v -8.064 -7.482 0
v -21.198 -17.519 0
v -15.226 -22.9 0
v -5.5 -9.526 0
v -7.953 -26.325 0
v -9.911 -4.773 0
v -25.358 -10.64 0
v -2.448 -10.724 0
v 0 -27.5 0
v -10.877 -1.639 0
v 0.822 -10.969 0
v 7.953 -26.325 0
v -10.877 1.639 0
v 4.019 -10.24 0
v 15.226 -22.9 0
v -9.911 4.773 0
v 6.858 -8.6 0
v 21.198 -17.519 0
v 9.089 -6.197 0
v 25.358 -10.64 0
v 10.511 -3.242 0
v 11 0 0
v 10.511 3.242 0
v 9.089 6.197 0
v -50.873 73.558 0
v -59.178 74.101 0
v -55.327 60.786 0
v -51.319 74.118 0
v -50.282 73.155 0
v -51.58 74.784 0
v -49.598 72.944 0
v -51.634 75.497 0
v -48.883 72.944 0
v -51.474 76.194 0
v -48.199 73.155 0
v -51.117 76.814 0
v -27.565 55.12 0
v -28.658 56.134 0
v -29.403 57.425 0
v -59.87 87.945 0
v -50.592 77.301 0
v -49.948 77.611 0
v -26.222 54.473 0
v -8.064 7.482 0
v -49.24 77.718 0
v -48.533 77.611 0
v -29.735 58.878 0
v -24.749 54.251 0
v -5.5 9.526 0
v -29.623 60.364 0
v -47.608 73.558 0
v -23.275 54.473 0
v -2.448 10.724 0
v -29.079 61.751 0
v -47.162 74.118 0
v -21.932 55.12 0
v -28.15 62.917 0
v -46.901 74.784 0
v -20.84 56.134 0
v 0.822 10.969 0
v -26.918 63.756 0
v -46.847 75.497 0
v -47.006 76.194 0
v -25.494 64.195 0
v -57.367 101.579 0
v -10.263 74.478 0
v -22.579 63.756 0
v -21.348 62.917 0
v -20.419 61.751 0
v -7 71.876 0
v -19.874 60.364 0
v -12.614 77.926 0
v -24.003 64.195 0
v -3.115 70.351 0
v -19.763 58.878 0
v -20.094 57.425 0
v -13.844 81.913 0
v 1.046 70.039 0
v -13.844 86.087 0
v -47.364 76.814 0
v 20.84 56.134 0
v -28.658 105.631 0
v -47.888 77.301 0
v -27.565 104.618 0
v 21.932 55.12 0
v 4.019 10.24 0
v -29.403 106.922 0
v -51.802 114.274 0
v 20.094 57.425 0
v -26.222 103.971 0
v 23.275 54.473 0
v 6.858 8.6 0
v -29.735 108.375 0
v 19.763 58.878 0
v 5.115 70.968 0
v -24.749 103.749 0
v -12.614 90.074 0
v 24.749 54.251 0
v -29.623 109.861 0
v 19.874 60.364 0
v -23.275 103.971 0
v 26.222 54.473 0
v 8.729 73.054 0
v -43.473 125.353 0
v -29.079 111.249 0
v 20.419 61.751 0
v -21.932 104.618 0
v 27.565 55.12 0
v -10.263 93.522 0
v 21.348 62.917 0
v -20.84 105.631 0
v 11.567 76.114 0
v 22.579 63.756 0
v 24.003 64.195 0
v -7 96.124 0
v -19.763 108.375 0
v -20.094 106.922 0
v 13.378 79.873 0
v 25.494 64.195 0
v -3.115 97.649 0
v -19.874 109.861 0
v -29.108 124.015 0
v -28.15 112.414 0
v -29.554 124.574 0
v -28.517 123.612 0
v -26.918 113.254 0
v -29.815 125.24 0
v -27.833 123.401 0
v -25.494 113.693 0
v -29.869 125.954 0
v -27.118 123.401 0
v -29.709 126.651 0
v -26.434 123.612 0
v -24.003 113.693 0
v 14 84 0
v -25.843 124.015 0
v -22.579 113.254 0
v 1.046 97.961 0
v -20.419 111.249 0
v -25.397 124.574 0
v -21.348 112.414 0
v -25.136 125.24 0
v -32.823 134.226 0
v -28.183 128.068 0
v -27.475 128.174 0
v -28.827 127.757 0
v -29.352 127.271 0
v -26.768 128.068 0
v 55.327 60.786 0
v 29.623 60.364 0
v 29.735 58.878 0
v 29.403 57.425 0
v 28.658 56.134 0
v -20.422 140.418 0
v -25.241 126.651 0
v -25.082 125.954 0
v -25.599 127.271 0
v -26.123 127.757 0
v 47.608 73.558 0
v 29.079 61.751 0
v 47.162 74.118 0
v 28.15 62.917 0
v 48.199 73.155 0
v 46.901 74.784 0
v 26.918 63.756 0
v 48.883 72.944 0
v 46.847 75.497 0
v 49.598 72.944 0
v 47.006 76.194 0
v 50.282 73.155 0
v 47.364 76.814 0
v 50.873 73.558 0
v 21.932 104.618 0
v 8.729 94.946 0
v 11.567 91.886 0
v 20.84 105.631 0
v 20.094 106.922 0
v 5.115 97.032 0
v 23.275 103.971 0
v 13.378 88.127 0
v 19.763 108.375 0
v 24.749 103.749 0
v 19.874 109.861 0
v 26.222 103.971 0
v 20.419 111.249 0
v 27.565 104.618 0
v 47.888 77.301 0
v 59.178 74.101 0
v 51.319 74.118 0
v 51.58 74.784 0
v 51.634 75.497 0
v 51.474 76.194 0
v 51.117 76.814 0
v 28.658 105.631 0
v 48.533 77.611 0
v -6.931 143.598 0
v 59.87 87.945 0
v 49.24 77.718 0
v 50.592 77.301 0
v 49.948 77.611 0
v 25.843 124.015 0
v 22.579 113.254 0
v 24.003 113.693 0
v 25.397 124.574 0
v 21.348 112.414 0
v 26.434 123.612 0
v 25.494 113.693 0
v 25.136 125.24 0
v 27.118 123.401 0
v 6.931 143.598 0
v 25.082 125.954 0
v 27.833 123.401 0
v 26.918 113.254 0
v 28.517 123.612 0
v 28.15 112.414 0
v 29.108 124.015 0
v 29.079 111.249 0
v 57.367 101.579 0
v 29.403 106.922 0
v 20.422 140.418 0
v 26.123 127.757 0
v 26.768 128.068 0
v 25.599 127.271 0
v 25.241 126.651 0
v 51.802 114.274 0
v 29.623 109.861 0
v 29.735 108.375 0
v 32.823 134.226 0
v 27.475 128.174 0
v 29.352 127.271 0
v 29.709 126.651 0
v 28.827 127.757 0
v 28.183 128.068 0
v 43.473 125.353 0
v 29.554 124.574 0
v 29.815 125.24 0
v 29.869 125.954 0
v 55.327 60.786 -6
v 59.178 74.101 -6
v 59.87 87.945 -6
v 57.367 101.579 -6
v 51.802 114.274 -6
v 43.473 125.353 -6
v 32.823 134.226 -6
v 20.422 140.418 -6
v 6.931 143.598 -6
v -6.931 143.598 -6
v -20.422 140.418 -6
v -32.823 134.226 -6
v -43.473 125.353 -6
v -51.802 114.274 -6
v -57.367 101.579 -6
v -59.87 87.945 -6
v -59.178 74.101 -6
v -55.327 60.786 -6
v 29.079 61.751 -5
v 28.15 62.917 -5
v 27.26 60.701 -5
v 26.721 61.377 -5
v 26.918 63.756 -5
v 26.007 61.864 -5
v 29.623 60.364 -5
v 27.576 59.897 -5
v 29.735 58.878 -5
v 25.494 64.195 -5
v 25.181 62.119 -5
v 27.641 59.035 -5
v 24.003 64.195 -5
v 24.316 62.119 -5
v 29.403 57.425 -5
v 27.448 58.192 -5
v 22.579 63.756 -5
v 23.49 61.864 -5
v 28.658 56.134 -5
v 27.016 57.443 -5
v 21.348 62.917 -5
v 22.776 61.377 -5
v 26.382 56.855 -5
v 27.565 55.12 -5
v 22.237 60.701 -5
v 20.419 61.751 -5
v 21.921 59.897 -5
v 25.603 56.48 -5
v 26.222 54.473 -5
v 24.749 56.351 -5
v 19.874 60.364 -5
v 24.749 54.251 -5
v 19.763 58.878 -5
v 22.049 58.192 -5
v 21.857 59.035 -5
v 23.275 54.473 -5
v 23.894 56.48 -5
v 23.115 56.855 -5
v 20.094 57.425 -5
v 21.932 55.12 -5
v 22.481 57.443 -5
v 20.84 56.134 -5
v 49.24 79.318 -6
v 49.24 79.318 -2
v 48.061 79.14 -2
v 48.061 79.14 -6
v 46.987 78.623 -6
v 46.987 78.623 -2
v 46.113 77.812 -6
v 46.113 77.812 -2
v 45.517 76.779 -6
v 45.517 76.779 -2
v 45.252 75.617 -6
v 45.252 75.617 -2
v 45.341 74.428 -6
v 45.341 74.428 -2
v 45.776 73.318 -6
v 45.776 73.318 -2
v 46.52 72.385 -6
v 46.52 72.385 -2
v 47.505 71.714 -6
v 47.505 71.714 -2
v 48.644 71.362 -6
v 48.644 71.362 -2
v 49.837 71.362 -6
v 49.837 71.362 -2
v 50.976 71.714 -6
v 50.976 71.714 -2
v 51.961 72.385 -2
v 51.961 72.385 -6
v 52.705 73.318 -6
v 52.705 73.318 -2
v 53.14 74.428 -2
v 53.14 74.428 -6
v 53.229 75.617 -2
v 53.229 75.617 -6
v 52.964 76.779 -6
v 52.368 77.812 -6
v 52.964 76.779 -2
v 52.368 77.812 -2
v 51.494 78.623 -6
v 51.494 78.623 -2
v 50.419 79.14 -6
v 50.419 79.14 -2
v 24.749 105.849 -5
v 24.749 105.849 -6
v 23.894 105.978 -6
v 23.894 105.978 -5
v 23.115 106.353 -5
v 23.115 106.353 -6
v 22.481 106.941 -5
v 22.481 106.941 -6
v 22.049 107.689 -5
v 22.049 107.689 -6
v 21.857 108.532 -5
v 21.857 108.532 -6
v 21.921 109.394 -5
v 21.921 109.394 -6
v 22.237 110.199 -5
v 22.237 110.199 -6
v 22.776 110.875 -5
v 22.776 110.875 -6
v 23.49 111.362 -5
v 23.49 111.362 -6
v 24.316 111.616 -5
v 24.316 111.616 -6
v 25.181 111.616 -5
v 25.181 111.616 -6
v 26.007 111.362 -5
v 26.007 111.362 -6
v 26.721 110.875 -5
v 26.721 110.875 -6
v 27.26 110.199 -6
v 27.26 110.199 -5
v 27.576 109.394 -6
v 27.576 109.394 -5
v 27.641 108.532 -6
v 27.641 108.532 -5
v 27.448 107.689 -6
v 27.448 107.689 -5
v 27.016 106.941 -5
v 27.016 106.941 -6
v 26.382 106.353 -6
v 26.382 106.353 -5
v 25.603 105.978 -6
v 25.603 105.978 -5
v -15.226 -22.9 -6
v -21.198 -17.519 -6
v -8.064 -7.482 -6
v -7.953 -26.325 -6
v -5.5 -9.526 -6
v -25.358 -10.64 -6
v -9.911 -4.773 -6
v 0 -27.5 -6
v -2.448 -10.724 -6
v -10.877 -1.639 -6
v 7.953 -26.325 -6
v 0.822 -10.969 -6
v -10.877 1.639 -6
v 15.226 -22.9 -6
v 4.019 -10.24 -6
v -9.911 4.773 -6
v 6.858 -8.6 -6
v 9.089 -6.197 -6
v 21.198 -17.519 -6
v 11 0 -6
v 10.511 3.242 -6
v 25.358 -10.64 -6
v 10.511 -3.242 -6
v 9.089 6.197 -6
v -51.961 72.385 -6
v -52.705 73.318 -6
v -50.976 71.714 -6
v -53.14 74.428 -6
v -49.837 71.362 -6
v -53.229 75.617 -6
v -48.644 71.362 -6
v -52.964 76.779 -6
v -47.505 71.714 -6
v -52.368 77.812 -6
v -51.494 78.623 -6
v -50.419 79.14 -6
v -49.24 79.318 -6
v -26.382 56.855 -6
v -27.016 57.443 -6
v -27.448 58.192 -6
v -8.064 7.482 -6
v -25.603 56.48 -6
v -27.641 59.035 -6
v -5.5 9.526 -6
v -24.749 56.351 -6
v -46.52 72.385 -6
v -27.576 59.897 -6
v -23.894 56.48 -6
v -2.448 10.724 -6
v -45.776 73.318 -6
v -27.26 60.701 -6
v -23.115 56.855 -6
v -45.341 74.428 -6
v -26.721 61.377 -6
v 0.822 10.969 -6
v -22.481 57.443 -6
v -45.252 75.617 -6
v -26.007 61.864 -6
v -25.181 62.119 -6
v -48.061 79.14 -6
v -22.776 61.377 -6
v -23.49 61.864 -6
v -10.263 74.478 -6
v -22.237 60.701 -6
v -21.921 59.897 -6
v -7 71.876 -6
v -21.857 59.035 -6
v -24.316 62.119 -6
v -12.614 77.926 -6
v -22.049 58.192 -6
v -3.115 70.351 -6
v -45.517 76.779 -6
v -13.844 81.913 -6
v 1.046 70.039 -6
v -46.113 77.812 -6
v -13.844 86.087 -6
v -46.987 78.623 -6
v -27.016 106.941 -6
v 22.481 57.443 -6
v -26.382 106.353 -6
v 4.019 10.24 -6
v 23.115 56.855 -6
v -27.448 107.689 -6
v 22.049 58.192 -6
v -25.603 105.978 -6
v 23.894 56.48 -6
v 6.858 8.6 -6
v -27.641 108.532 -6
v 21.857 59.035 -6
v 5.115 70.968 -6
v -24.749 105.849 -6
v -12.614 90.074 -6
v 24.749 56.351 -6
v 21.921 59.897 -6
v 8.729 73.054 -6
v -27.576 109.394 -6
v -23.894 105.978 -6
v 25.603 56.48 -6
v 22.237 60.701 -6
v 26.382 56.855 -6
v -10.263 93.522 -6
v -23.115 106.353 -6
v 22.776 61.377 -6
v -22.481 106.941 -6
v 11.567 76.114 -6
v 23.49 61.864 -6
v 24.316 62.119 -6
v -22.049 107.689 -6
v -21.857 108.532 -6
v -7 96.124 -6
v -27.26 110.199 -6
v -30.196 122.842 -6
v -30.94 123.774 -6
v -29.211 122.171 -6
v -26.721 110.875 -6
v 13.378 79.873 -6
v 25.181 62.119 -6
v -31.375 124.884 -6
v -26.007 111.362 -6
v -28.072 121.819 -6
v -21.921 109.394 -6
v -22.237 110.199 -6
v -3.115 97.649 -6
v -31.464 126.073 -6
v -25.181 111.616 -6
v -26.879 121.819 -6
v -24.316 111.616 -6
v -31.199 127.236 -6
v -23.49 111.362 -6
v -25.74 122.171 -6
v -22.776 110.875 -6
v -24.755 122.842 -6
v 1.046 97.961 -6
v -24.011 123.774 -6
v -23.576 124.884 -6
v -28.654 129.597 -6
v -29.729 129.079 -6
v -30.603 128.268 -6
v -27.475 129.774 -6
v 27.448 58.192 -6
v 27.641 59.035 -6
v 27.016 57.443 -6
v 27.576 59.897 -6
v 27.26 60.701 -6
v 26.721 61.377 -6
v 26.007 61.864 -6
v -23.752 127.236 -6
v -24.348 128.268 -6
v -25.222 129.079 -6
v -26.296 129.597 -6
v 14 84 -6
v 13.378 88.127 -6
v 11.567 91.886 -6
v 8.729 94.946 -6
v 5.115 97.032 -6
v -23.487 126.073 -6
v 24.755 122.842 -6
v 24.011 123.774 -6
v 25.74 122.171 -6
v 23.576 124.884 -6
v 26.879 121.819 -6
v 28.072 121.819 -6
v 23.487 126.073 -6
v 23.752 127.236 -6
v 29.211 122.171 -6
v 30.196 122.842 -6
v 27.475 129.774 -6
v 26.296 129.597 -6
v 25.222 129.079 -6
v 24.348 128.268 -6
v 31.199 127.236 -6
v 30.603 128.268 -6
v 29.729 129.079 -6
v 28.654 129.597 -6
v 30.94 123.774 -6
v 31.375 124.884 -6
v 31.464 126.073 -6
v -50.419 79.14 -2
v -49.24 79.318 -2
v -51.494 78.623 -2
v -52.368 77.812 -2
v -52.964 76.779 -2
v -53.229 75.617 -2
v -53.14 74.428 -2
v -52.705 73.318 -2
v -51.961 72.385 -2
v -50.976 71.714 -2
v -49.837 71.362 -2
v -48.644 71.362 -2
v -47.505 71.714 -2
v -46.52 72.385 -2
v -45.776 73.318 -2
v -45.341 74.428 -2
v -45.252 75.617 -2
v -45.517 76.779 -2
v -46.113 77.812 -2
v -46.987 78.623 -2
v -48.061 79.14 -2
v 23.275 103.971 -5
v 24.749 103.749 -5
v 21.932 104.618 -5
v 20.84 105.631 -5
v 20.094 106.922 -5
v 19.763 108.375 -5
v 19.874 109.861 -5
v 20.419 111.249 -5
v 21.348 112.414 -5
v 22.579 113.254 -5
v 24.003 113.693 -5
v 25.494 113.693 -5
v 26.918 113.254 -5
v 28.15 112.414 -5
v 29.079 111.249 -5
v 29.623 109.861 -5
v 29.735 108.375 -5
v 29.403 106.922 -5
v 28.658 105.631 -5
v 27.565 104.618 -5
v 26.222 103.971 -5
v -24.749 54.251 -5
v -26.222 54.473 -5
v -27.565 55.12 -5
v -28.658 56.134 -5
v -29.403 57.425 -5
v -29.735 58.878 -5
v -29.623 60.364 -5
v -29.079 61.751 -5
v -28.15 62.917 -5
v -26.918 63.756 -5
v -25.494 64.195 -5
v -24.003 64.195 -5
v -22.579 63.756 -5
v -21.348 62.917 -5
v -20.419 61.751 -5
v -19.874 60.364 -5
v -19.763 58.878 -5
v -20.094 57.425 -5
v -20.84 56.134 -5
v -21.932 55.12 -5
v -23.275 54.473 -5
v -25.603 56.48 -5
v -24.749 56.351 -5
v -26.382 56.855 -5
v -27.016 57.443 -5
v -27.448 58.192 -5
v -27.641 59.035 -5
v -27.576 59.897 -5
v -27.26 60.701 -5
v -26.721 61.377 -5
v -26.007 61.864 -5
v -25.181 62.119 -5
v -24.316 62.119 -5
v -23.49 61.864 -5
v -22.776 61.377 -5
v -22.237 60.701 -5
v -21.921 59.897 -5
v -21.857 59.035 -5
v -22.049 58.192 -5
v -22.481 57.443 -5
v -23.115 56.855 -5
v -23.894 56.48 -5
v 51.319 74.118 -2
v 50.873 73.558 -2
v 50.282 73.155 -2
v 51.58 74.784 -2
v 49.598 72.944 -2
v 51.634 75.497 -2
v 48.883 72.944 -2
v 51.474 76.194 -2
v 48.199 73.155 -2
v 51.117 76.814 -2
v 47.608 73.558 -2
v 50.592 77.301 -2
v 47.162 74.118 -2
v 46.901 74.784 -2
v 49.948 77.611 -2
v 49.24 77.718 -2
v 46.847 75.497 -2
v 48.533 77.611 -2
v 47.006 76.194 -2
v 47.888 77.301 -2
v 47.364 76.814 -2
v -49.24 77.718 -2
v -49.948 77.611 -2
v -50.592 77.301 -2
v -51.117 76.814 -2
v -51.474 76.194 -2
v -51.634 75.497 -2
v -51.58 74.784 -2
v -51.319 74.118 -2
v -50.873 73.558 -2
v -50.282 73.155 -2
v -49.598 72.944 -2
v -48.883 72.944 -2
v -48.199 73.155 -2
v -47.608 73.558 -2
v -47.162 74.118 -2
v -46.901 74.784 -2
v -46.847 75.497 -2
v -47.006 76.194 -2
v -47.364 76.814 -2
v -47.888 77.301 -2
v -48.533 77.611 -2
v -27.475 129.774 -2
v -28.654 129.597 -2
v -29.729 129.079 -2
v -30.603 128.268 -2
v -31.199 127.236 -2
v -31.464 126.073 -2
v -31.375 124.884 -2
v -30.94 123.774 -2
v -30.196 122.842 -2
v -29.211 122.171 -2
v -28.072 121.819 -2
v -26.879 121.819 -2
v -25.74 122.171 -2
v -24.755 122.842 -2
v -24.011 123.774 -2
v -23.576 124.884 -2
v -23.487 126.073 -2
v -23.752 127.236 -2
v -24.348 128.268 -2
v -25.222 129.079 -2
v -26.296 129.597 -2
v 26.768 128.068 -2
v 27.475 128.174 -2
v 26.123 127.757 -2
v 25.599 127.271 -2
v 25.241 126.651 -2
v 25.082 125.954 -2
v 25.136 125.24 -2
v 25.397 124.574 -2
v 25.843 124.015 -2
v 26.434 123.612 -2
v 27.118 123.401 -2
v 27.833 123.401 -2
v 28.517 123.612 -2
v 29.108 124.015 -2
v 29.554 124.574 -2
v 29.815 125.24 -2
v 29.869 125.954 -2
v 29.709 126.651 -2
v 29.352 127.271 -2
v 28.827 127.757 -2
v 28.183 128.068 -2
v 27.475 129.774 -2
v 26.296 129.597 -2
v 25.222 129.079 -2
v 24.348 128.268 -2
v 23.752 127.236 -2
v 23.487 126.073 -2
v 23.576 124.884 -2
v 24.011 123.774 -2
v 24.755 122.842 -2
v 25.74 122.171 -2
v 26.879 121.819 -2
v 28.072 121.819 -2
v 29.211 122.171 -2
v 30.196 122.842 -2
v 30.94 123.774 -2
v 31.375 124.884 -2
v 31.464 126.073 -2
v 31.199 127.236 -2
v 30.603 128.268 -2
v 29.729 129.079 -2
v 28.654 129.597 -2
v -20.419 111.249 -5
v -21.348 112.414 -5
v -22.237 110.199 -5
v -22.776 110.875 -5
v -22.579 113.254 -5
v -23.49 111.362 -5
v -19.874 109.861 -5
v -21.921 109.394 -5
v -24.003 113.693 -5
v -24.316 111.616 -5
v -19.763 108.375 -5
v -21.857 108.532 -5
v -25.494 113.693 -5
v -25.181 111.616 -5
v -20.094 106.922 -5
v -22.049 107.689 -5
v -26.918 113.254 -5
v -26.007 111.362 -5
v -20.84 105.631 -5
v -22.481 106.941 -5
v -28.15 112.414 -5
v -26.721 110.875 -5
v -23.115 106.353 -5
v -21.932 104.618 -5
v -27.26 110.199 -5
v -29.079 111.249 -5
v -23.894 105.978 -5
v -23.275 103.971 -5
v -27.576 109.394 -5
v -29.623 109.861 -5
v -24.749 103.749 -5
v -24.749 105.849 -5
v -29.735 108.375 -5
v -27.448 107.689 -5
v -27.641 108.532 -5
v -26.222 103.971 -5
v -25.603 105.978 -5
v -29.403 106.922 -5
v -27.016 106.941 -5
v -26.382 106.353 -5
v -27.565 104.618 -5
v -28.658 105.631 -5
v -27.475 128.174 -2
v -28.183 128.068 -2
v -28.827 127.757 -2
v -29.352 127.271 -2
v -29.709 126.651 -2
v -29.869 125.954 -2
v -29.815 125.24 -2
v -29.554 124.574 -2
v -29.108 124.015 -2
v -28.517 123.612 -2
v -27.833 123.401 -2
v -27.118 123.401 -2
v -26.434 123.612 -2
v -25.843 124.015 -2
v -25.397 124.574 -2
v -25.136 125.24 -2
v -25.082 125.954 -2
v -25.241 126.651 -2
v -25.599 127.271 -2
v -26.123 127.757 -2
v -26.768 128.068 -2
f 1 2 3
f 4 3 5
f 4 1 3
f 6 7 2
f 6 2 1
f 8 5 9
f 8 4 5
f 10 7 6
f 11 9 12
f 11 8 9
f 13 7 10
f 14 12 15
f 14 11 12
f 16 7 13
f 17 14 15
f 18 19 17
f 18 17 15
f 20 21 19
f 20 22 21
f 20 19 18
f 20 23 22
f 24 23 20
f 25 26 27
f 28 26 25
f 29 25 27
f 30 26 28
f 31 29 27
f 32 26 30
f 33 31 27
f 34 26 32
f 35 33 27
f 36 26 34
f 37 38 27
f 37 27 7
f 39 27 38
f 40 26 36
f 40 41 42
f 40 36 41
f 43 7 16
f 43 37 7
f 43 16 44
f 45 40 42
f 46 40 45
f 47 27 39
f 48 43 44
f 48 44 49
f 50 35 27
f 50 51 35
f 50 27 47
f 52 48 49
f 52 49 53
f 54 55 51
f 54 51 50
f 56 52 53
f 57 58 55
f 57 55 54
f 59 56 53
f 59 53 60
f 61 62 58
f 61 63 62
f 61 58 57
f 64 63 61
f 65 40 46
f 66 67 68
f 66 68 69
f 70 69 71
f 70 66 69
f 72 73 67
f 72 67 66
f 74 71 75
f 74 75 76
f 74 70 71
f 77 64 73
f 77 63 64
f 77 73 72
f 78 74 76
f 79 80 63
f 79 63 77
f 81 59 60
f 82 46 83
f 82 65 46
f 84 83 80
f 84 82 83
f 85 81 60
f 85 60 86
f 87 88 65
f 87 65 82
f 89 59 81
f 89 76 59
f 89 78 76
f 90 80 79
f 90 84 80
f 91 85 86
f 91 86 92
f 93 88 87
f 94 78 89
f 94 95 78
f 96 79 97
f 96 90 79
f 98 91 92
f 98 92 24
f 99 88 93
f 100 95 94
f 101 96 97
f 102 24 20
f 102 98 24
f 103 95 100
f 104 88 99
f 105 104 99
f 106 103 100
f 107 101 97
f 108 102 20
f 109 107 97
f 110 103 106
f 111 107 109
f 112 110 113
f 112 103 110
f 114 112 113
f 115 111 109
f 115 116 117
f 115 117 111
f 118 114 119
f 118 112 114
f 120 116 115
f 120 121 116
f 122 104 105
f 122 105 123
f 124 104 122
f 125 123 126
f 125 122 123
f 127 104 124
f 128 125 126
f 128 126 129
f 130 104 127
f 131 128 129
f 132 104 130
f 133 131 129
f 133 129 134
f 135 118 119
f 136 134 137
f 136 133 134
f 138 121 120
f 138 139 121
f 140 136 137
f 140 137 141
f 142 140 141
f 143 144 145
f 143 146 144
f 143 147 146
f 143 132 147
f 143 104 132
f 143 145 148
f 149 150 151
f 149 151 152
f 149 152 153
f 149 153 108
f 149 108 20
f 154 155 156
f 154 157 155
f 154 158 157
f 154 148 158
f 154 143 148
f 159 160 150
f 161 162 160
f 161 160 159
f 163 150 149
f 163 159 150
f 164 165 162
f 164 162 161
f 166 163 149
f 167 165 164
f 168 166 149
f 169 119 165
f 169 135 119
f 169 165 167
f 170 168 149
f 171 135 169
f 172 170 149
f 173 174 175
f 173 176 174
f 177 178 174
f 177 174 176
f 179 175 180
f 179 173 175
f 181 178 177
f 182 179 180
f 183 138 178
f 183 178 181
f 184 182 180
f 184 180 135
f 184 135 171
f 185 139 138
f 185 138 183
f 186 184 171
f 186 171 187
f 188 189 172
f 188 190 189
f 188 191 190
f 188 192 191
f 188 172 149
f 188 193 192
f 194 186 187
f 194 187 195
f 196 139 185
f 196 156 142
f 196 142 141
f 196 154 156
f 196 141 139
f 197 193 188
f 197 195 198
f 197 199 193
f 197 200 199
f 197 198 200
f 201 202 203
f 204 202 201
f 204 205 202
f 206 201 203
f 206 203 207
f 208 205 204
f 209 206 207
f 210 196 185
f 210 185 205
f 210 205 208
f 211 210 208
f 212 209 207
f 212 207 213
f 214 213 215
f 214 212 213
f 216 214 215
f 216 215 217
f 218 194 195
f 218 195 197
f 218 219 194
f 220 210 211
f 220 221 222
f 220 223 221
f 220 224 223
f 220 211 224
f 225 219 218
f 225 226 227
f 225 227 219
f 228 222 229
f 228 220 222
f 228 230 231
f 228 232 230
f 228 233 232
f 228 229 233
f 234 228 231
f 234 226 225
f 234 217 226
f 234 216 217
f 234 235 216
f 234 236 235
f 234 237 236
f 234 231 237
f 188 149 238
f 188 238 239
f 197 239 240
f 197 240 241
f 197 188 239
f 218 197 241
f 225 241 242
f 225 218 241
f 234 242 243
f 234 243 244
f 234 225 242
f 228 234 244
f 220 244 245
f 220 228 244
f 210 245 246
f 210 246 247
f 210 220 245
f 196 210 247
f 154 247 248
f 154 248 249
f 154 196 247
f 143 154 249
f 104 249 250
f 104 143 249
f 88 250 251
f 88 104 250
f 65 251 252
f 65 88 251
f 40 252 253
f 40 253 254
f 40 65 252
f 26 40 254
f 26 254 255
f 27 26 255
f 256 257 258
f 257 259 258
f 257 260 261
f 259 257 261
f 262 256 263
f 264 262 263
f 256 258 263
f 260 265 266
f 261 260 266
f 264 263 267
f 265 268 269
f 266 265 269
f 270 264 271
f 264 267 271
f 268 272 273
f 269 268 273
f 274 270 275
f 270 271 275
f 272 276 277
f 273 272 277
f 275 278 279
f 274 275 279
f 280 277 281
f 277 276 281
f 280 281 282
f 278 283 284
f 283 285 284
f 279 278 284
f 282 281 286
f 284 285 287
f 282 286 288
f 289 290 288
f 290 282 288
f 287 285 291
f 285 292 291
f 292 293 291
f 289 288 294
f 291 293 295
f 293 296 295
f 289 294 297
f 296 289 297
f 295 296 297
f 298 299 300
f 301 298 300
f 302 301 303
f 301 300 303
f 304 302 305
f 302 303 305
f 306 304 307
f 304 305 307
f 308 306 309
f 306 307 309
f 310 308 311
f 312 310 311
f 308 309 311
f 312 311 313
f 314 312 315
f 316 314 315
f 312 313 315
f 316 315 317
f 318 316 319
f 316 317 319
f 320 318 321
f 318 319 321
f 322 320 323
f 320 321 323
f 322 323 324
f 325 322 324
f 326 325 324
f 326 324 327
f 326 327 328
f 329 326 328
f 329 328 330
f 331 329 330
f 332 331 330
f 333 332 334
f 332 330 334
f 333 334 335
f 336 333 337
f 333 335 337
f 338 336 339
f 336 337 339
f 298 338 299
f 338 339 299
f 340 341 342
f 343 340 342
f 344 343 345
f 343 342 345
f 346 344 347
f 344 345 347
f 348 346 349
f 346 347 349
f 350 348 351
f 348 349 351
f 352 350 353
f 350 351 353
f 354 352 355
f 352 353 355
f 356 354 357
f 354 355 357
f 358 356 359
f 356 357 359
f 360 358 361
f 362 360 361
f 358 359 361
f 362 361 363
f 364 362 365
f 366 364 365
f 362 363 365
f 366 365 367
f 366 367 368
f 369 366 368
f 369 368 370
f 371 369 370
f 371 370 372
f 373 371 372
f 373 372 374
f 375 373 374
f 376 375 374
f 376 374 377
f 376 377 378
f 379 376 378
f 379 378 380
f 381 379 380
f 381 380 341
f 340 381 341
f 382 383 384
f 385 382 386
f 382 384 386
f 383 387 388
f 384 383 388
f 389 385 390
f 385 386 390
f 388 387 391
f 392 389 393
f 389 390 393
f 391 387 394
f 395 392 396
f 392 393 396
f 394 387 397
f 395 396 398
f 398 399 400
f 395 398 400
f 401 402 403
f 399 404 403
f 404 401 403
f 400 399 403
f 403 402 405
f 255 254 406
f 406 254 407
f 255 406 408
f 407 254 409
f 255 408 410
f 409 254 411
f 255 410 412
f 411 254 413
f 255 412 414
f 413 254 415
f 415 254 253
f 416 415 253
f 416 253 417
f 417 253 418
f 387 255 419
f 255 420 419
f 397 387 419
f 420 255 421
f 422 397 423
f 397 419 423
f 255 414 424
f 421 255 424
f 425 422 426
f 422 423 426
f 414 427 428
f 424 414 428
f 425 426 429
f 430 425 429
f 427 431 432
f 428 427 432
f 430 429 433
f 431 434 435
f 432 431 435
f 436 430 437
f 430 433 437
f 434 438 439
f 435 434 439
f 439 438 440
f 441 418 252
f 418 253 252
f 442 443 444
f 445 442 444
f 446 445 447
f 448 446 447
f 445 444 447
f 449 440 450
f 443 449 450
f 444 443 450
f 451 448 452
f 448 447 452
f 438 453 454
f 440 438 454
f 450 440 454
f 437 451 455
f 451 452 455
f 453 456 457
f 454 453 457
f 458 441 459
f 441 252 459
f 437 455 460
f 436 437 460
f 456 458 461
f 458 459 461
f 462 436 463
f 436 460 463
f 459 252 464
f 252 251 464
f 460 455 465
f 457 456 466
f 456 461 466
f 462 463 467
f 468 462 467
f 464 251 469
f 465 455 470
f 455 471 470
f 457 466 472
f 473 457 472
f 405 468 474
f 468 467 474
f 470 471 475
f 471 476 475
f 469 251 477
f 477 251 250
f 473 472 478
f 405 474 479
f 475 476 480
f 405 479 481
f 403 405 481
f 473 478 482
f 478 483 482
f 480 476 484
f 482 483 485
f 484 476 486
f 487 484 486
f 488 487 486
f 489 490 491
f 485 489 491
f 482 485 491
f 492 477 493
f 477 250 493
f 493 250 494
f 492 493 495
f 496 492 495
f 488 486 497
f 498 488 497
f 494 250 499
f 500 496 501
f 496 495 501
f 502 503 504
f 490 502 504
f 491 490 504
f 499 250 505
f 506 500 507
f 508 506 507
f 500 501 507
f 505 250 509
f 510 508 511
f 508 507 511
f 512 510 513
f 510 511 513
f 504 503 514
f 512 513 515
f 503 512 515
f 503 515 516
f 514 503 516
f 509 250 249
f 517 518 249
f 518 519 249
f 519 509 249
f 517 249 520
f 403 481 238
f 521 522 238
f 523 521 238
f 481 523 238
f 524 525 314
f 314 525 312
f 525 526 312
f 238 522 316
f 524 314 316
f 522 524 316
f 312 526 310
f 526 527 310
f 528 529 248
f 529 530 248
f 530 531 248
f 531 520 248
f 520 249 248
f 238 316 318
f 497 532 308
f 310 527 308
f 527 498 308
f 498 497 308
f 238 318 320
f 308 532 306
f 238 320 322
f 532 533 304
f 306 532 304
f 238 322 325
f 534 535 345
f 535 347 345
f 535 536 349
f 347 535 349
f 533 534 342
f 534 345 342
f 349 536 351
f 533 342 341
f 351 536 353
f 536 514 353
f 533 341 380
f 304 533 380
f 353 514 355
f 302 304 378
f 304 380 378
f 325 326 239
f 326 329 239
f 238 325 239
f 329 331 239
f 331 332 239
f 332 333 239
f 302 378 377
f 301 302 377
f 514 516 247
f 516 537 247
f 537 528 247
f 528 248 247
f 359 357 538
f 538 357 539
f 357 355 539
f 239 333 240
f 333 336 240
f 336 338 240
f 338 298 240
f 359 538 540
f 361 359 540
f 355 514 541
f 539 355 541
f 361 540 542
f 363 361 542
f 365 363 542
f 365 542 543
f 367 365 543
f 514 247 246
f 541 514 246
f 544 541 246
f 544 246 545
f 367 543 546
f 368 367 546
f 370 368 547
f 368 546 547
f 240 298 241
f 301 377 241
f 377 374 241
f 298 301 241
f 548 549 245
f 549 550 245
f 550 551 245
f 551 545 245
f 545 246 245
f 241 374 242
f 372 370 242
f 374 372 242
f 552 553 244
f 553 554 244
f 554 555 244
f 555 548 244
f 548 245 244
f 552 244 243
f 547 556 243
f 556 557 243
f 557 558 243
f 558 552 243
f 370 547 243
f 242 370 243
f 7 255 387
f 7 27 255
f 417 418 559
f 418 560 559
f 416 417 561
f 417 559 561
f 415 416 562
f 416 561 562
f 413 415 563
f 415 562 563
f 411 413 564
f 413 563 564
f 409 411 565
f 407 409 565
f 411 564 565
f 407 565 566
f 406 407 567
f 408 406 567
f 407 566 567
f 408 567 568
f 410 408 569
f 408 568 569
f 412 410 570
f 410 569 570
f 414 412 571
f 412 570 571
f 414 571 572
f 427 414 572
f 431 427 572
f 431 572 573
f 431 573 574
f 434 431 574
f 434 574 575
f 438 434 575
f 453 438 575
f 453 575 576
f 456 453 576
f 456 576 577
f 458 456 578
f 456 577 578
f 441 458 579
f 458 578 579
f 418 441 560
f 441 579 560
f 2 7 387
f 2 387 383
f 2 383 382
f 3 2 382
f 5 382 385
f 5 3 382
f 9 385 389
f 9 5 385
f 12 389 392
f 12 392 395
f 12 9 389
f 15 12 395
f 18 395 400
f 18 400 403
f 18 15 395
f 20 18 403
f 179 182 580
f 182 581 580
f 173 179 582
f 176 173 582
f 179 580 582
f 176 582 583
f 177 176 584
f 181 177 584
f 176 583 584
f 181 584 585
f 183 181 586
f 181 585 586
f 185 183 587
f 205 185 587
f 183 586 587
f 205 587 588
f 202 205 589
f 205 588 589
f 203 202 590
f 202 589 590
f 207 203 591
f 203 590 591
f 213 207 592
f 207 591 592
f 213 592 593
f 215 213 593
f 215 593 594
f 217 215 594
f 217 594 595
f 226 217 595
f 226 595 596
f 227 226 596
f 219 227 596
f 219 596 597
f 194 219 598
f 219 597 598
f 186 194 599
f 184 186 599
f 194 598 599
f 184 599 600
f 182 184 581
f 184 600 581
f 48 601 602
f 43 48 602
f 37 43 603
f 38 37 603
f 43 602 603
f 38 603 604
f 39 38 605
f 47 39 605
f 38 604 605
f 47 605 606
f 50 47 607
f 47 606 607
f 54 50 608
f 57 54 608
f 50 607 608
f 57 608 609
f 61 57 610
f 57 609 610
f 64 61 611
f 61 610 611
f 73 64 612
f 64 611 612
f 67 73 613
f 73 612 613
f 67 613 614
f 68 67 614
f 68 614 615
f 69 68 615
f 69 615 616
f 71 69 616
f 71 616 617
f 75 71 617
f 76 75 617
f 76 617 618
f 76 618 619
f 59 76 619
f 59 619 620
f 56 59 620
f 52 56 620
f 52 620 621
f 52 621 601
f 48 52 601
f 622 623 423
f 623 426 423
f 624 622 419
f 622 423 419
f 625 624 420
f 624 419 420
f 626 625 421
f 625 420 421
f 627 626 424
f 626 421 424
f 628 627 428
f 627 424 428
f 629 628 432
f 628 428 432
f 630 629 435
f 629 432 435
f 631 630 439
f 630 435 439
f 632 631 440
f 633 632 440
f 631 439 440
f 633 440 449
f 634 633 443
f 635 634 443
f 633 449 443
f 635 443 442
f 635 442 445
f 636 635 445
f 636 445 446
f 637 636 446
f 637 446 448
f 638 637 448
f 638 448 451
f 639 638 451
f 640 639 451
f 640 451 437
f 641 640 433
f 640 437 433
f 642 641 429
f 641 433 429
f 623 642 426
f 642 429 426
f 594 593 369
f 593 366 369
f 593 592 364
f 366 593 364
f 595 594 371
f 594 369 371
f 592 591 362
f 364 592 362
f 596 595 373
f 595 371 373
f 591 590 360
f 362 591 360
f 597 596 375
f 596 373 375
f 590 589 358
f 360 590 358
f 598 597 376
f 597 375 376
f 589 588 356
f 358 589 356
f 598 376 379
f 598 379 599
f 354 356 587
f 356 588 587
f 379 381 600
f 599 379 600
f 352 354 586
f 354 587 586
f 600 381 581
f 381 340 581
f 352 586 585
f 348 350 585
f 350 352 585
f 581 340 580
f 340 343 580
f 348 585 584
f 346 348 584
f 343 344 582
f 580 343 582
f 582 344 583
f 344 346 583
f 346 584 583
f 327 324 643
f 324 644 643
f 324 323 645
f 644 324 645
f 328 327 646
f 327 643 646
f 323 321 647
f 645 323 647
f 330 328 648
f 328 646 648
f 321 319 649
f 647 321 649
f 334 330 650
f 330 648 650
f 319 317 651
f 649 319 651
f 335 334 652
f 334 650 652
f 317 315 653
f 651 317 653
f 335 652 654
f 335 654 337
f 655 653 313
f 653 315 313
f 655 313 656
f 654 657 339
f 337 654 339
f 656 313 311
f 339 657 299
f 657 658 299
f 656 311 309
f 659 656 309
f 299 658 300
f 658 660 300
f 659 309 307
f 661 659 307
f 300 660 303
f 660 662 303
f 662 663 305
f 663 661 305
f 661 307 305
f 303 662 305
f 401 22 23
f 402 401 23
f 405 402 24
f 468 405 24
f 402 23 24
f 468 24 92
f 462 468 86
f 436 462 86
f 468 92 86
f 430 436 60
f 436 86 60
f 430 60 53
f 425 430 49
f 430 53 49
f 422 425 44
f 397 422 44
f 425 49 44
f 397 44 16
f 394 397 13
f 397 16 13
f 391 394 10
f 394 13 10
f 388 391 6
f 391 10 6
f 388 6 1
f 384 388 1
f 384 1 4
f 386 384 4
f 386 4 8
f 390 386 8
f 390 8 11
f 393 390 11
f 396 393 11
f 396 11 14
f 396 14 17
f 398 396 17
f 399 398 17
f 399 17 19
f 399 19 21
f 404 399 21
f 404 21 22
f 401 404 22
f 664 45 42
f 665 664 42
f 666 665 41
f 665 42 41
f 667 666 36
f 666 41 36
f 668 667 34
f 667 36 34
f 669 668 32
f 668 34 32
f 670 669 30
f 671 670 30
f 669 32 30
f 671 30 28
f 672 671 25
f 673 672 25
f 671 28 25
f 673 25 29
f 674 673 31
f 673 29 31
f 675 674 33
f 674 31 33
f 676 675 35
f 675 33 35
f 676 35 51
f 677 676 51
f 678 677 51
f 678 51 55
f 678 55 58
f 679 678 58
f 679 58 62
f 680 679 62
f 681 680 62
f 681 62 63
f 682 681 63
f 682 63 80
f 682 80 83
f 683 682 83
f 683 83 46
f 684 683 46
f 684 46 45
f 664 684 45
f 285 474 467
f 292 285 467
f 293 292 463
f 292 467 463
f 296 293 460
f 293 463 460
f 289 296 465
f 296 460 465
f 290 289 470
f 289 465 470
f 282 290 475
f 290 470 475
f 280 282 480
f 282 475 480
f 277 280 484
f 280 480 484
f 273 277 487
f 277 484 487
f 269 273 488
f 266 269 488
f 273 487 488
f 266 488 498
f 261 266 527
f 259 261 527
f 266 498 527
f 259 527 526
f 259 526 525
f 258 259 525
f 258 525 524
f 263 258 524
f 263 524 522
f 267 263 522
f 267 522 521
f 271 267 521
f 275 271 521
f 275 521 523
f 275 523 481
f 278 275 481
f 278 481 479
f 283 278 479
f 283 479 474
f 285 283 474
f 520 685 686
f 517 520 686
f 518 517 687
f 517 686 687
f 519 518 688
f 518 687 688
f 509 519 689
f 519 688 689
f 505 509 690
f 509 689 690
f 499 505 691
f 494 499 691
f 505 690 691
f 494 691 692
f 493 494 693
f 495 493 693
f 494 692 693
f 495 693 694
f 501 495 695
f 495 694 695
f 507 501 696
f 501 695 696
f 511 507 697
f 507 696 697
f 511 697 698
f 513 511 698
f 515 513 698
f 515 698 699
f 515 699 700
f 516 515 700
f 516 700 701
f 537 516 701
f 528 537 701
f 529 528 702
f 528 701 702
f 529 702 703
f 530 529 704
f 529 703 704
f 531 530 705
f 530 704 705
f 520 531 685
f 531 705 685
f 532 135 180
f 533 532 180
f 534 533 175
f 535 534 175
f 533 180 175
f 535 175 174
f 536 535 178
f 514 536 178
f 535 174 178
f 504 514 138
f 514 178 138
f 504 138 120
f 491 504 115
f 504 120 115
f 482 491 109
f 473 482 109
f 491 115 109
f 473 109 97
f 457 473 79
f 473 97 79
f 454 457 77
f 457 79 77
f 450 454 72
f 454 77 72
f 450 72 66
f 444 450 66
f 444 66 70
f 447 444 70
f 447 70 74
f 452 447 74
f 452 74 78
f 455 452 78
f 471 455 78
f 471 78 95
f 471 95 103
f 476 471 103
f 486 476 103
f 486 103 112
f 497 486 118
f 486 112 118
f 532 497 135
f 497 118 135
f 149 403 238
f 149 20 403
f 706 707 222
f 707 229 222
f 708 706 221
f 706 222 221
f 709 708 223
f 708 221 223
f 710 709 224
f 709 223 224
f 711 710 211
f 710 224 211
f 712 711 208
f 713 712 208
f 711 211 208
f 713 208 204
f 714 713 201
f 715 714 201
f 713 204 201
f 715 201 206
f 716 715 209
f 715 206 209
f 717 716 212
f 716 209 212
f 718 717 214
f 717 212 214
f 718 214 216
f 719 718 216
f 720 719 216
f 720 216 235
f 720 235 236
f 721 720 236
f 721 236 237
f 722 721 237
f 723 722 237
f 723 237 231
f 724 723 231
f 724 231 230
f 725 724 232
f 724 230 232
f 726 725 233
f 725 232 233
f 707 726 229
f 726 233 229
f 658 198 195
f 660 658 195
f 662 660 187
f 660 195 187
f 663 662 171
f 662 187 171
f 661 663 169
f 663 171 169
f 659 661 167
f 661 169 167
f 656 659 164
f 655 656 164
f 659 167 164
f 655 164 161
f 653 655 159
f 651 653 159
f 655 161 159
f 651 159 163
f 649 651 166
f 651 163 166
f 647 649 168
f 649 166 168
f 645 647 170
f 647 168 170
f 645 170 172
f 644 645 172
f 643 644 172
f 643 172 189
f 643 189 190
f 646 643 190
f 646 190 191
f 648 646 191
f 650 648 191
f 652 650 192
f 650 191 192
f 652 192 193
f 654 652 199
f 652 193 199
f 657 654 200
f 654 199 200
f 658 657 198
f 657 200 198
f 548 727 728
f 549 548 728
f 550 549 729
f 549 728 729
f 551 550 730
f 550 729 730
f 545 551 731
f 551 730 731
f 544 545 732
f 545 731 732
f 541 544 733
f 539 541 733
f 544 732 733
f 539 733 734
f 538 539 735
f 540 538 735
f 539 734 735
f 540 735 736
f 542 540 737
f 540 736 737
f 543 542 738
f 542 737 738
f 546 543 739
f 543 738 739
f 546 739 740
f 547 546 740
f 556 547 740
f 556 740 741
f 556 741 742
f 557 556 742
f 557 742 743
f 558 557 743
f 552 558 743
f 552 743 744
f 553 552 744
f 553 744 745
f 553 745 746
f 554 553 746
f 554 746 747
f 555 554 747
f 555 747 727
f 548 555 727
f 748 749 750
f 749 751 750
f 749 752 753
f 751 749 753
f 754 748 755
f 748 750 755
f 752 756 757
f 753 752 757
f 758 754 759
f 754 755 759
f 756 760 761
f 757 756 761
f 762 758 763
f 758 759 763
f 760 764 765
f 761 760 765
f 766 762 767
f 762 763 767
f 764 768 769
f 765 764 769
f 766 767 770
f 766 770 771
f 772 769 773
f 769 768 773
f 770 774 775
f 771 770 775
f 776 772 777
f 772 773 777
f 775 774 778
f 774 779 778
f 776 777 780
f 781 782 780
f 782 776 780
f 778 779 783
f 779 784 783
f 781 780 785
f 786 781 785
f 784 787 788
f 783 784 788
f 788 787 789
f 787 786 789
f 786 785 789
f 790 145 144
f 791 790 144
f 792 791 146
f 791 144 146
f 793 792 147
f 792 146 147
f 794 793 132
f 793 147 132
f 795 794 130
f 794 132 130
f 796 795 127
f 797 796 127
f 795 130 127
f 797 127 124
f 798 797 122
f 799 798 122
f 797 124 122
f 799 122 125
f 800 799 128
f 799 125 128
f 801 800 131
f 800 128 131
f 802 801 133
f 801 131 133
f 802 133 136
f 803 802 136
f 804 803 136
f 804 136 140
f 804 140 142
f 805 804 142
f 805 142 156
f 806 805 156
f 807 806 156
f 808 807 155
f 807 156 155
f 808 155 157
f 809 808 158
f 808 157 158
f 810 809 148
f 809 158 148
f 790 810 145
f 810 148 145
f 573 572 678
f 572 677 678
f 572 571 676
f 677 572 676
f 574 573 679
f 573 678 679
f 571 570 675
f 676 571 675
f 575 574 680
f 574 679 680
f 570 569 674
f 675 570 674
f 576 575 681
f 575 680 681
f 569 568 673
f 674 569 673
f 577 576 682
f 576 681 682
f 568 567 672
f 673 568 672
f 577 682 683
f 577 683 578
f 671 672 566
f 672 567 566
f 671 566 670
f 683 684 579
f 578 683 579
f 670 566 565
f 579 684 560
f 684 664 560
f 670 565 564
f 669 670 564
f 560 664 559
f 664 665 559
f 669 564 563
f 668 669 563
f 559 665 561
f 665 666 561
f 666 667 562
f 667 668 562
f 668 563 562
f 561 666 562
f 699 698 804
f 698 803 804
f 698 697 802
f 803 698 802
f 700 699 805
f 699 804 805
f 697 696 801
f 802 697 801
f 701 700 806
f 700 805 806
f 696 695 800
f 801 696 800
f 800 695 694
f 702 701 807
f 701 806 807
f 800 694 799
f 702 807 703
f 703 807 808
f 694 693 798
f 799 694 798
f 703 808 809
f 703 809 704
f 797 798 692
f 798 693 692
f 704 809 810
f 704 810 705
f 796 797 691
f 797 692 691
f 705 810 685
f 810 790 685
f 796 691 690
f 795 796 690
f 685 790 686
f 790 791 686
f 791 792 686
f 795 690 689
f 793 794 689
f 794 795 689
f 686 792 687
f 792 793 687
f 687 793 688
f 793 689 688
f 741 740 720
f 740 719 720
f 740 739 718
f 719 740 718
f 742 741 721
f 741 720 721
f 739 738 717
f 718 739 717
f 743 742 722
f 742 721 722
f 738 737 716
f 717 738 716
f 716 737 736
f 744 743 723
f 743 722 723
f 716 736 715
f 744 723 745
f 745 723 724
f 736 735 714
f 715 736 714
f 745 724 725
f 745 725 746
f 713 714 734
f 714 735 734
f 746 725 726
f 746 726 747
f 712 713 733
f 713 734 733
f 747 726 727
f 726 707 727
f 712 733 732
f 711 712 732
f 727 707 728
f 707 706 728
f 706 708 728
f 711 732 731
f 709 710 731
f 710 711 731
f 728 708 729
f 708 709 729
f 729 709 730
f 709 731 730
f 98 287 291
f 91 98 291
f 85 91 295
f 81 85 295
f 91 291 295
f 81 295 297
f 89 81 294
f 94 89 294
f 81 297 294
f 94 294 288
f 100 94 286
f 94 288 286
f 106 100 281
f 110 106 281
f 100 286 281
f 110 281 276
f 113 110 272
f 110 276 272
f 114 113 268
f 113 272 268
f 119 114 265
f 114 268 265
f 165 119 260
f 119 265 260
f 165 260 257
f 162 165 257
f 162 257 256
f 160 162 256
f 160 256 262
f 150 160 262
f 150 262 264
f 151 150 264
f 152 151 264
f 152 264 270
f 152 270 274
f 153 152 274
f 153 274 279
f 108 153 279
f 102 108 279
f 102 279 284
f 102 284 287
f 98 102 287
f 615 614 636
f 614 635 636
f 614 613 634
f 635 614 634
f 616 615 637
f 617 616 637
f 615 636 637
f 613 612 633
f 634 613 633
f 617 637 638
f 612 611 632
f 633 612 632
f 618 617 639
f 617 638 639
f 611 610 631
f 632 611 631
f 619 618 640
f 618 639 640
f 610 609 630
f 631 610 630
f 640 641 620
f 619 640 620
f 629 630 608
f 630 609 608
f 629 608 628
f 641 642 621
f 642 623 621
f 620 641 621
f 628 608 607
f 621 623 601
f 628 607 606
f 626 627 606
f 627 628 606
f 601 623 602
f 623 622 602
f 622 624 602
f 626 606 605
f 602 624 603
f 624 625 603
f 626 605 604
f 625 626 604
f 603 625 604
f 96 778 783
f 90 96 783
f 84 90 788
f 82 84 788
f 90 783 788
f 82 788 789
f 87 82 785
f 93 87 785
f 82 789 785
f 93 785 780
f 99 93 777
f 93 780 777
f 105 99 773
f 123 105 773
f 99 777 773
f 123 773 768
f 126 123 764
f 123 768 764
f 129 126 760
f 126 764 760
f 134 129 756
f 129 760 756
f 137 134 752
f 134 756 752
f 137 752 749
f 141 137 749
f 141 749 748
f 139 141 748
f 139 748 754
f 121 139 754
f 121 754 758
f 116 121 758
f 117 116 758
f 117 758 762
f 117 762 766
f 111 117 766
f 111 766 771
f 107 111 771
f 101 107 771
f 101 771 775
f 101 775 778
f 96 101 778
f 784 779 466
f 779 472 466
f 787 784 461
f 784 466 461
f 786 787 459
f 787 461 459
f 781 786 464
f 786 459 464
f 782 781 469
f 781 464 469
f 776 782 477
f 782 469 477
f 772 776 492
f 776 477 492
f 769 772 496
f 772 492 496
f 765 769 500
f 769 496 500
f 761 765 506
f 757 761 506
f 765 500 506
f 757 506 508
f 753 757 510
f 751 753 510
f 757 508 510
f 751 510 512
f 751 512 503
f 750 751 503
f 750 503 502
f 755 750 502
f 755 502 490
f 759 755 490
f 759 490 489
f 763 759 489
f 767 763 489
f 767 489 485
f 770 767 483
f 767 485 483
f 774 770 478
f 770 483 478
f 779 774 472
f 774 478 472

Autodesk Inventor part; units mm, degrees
ref_plane "YZ Plane" through (0, 0, 0) normal (1, 0, 0) x (0, 1, 0)
ref_plane "XZ Plane" through (0, 0, 0) normal (0, 1, 0) x (-1, 0, 0)
ref_plane "XY Plane" through (0, 0, 0) normal (0, 0, 1) x (1, 0, 0)
sketch "Sketch1" plane through (0, 0, 0) normal (0, 0, 1) x (1, 0, 0)
  circle A0 centre (0, 0) radius 11
  circle A1 centre (0, 84) radius 14
  circle A2 centre (0, 0) radius 72 construction
  circle A3 centre (0, 84) radius 12 construction
  line L0 (0, 84) -> (0, 0) construction
  line L1 (-67.6579, 24.6255) -> (0, 0) construction
  line L2 (67.6579, 24.6255) -> (0, 0) construction
  circle A4 centre (0, 84) radius 35 construction
  line L3 (-60, 71.9226) -> (-60, 144)
  line L4 (-60, 144) -> (60, 144)
  line L5 (60, 144) -> (60, 71.9226)
  circle A5 centre (0, 0) radius 27.5
  line L6 (25.3583, -10.6399) -> (60, 71.9226)
  line L7 (-60, 71.9226) -> (-25.3583, -10.6399)
  line L8 (0, 0) -> (135.9462, -63.3927) construction
  line L9 (-24.7487, 59.2513) -> (24.7487, 59.2513) construction
  circle A6 centre (0, 84) radius 60
  point P0 (24.7487, 108.7487)
  point P1 (-24.7487, 108.7487)
  point P2 (55.3272, 60.7857)
  point P3 (-55.3272, 60.7857)
  dimension "d7" = 70
  dimension "d1" = 24
  dimension "d2" = 144
  dimension "d3" = 28
  dimension "d4" = 22
  dimension "d6" = 220
  dimension "d10" = 360
  dimension "d12" = 55
  dimension "d17" = 150
  dimension "d18" = 45
  dimension "d28" = 120
sketch "Sketch2" plane through (0, 0, 0) normal (0, 0, 1) x (1, 0, 0)
  point P0 (0, 0)
extrude "Extrusion1" add sketch "Sketch1" against normal blind 6 contours A6 A5 | A6 A5 L7 | A5 A6 | A5 A6 | A5 A6 L6
hole "Hole1" at (-24.7487, 59.2513, 0) at (-24.7487, 108.7487, 0) at (24.7487, 108.7487, 0) at (24.7487, 59.2513, 0) direction (0, 0, -1) diameter 5.8 end through all counterbore diameter 10 counterbore depth 5 clearance for "Socket Head Cap Screw" size "M5" standard "Ansi Metric M Profile"
sketch "Sketch3" plane through (0, 0, -6) normal (0, 0, -1) x (-1, 0, 0)
  circle A0 centre (0, 84) radius 50 construction
  line L0 (0, 84) -> (0, 134) construction
  circle A1 centre (0, 84) radius 14 construction
  line L1 (-49.2404, 75.3176) -> (0, 84) construction
  point P0 (0, 0)
  point P1 (-27.4754, 125.7744)
  point P2 (27.4754, 125.7744)
  point P3 (49.2404, 75.3176)
  dimension "d29" = 100
  dimension "d30" = 100
  dimension "d33" = 200
hole "Hole2" at (0, 84, -6) at (49.2404, 75.3176, -6) at (27.4754, 125.7744, -6) at (-27.4754, 125.7744, -6) at (-49.2404, 75.3176, -6) direction (0, 0, 1) diameter 4.8 end through all counterbore diameter 8 counterbore depth 4 clearance for "Socket Head Cap Screw" size "M4" standard "Ansi Metric M Profile"
equation "\"d2\" = 6 * d1"
properties part number "RT_ARM_MC_008_Capstand_Base"
